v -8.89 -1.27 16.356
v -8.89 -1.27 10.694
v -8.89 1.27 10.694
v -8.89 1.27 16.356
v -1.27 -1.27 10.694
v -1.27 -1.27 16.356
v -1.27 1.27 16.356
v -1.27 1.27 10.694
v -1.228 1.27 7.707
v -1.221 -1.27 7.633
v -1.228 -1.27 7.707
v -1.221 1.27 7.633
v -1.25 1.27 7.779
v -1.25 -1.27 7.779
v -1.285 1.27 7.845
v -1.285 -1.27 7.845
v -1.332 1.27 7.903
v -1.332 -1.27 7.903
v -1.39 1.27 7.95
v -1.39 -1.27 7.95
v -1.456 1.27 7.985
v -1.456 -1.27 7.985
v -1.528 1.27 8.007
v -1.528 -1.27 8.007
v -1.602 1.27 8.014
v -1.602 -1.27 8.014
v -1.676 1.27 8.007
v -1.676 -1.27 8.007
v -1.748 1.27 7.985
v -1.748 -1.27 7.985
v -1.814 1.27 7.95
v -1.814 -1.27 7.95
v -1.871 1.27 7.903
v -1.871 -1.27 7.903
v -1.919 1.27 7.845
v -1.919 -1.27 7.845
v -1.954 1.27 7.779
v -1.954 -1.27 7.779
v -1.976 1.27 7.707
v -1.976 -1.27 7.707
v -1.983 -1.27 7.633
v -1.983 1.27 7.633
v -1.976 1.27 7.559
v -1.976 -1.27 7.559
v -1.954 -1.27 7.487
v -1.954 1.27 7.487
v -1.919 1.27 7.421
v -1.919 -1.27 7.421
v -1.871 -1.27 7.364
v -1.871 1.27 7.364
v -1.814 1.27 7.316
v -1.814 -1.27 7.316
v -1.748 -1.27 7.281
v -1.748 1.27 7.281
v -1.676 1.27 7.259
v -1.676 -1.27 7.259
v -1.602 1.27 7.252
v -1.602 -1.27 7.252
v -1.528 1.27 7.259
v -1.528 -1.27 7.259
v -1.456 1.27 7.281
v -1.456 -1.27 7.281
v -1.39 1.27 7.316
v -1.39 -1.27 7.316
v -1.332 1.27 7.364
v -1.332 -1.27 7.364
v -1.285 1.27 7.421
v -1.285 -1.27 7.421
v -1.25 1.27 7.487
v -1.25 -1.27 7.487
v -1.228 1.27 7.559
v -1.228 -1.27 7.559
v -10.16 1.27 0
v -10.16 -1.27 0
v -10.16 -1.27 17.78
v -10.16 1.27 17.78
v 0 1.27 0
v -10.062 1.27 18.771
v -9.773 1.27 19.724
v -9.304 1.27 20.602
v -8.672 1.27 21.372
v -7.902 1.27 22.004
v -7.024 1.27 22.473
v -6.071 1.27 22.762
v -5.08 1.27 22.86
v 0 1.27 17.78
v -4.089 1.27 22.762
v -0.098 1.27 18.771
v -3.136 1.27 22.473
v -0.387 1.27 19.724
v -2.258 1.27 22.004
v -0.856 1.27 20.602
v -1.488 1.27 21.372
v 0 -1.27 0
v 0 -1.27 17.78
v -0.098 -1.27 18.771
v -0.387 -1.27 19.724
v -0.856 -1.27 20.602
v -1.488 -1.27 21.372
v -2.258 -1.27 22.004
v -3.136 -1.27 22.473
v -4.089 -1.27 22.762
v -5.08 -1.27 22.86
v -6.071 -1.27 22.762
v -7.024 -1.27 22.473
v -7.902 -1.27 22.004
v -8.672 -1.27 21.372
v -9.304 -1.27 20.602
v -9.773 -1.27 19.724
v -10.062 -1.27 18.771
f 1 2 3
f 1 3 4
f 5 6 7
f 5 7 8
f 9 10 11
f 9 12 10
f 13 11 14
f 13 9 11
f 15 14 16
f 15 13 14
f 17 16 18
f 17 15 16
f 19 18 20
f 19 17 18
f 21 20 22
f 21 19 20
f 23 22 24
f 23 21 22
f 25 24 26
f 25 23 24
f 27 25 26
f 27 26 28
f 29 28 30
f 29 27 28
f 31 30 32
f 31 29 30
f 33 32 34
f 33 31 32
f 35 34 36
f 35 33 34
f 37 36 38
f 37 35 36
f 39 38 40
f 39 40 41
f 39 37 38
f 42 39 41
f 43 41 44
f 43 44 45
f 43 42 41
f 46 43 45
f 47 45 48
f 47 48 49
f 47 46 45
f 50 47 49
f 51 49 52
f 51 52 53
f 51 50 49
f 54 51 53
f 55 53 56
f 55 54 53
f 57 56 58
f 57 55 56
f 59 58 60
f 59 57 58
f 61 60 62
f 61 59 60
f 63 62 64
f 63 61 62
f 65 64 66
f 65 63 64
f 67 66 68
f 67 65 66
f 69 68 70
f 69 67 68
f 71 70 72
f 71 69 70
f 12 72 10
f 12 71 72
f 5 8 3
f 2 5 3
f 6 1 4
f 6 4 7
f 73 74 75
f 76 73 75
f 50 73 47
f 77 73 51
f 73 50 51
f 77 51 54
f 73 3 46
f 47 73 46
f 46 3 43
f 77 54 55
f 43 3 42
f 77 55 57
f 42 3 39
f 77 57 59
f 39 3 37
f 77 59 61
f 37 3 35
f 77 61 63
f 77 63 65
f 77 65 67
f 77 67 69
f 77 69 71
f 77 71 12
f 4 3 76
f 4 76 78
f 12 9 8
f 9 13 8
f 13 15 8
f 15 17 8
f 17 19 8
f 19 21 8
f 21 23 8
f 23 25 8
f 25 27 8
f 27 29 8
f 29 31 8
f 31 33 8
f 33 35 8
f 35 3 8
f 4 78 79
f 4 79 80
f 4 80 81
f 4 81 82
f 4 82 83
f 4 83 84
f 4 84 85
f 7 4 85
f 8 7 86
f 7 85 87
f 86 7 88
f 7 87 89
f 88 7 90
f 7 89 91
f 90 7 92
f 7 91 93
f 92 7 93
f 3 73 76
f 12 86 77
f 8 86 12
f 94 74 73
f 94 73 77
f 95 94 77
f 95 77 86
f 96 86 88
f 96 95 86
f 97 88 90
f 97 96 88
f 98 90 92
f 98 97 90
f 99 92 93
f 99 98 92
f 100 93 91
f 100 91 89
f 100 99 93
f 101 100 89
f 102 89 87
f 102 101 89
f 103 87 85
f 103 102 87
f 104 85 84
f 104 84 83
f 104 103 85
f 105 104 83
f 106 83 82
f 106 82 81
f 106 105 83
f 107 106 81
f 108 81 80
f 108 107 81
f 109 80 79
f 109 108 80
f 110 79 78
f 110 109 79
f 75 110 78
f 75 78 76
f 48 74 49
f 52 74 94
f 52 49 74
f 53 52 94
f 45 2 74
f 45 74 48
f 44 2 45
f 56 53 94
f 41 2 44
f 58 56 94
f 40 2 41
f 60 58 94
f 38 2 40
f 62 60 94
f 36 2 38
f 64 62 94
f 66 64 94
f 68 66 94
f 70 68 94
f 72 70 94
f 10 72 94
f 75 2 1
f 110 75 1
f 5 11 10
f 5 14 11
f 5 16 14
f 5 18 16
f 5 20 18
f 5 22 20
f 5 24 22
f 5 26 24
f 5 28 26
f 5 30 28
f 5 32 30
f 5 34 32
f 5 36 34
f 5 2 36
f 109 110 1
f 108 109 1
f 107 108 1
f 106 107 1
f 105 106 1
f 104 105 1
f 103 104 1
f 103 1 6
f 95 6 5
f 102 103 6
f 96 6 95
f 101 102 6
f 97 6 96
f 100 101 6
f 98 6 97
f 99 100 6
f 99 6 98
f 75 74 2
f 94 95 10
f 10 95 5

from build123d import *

# Parameters (mm, degrees)
F0_W     = 10.16
F0_H     = 17.78
F0_R     = 0.381
F1_DEPTH = 1.27


with BuildPart() as f1:
    # F0 (on Front) → F1 (new body, symmetric)
    with BuildSketch(Plane.XZ):
        with Locations((-5.08, 8.89)):
            Rectangle(F0_W, F0_H)
        with Locations((-1.60185, 7.633115)):
            Circle(F0_R, mode=Mode.SUBTRACT)
        Polygon((-8.89, 13.524802), (-8.89, 16.355868), (-5.08, 16.355868), (-1.27, 16.355868), (-1.27, 13.524802), (-1.27, 10.693735), (-5.08, 10.693735), (-8.89, 10.693735), align=None, mode=Mode.SUBTRACT)
        with BuildLine():
            Line((-10.16, 17.78), (0, 17.78))
            ThreePointArc((0, 17.78), (-5.08, 22.86), (-10.16, 17.78))
        make_face()
    extrude(amount=F1_DEPTH, both=True)


solid = f1.part
